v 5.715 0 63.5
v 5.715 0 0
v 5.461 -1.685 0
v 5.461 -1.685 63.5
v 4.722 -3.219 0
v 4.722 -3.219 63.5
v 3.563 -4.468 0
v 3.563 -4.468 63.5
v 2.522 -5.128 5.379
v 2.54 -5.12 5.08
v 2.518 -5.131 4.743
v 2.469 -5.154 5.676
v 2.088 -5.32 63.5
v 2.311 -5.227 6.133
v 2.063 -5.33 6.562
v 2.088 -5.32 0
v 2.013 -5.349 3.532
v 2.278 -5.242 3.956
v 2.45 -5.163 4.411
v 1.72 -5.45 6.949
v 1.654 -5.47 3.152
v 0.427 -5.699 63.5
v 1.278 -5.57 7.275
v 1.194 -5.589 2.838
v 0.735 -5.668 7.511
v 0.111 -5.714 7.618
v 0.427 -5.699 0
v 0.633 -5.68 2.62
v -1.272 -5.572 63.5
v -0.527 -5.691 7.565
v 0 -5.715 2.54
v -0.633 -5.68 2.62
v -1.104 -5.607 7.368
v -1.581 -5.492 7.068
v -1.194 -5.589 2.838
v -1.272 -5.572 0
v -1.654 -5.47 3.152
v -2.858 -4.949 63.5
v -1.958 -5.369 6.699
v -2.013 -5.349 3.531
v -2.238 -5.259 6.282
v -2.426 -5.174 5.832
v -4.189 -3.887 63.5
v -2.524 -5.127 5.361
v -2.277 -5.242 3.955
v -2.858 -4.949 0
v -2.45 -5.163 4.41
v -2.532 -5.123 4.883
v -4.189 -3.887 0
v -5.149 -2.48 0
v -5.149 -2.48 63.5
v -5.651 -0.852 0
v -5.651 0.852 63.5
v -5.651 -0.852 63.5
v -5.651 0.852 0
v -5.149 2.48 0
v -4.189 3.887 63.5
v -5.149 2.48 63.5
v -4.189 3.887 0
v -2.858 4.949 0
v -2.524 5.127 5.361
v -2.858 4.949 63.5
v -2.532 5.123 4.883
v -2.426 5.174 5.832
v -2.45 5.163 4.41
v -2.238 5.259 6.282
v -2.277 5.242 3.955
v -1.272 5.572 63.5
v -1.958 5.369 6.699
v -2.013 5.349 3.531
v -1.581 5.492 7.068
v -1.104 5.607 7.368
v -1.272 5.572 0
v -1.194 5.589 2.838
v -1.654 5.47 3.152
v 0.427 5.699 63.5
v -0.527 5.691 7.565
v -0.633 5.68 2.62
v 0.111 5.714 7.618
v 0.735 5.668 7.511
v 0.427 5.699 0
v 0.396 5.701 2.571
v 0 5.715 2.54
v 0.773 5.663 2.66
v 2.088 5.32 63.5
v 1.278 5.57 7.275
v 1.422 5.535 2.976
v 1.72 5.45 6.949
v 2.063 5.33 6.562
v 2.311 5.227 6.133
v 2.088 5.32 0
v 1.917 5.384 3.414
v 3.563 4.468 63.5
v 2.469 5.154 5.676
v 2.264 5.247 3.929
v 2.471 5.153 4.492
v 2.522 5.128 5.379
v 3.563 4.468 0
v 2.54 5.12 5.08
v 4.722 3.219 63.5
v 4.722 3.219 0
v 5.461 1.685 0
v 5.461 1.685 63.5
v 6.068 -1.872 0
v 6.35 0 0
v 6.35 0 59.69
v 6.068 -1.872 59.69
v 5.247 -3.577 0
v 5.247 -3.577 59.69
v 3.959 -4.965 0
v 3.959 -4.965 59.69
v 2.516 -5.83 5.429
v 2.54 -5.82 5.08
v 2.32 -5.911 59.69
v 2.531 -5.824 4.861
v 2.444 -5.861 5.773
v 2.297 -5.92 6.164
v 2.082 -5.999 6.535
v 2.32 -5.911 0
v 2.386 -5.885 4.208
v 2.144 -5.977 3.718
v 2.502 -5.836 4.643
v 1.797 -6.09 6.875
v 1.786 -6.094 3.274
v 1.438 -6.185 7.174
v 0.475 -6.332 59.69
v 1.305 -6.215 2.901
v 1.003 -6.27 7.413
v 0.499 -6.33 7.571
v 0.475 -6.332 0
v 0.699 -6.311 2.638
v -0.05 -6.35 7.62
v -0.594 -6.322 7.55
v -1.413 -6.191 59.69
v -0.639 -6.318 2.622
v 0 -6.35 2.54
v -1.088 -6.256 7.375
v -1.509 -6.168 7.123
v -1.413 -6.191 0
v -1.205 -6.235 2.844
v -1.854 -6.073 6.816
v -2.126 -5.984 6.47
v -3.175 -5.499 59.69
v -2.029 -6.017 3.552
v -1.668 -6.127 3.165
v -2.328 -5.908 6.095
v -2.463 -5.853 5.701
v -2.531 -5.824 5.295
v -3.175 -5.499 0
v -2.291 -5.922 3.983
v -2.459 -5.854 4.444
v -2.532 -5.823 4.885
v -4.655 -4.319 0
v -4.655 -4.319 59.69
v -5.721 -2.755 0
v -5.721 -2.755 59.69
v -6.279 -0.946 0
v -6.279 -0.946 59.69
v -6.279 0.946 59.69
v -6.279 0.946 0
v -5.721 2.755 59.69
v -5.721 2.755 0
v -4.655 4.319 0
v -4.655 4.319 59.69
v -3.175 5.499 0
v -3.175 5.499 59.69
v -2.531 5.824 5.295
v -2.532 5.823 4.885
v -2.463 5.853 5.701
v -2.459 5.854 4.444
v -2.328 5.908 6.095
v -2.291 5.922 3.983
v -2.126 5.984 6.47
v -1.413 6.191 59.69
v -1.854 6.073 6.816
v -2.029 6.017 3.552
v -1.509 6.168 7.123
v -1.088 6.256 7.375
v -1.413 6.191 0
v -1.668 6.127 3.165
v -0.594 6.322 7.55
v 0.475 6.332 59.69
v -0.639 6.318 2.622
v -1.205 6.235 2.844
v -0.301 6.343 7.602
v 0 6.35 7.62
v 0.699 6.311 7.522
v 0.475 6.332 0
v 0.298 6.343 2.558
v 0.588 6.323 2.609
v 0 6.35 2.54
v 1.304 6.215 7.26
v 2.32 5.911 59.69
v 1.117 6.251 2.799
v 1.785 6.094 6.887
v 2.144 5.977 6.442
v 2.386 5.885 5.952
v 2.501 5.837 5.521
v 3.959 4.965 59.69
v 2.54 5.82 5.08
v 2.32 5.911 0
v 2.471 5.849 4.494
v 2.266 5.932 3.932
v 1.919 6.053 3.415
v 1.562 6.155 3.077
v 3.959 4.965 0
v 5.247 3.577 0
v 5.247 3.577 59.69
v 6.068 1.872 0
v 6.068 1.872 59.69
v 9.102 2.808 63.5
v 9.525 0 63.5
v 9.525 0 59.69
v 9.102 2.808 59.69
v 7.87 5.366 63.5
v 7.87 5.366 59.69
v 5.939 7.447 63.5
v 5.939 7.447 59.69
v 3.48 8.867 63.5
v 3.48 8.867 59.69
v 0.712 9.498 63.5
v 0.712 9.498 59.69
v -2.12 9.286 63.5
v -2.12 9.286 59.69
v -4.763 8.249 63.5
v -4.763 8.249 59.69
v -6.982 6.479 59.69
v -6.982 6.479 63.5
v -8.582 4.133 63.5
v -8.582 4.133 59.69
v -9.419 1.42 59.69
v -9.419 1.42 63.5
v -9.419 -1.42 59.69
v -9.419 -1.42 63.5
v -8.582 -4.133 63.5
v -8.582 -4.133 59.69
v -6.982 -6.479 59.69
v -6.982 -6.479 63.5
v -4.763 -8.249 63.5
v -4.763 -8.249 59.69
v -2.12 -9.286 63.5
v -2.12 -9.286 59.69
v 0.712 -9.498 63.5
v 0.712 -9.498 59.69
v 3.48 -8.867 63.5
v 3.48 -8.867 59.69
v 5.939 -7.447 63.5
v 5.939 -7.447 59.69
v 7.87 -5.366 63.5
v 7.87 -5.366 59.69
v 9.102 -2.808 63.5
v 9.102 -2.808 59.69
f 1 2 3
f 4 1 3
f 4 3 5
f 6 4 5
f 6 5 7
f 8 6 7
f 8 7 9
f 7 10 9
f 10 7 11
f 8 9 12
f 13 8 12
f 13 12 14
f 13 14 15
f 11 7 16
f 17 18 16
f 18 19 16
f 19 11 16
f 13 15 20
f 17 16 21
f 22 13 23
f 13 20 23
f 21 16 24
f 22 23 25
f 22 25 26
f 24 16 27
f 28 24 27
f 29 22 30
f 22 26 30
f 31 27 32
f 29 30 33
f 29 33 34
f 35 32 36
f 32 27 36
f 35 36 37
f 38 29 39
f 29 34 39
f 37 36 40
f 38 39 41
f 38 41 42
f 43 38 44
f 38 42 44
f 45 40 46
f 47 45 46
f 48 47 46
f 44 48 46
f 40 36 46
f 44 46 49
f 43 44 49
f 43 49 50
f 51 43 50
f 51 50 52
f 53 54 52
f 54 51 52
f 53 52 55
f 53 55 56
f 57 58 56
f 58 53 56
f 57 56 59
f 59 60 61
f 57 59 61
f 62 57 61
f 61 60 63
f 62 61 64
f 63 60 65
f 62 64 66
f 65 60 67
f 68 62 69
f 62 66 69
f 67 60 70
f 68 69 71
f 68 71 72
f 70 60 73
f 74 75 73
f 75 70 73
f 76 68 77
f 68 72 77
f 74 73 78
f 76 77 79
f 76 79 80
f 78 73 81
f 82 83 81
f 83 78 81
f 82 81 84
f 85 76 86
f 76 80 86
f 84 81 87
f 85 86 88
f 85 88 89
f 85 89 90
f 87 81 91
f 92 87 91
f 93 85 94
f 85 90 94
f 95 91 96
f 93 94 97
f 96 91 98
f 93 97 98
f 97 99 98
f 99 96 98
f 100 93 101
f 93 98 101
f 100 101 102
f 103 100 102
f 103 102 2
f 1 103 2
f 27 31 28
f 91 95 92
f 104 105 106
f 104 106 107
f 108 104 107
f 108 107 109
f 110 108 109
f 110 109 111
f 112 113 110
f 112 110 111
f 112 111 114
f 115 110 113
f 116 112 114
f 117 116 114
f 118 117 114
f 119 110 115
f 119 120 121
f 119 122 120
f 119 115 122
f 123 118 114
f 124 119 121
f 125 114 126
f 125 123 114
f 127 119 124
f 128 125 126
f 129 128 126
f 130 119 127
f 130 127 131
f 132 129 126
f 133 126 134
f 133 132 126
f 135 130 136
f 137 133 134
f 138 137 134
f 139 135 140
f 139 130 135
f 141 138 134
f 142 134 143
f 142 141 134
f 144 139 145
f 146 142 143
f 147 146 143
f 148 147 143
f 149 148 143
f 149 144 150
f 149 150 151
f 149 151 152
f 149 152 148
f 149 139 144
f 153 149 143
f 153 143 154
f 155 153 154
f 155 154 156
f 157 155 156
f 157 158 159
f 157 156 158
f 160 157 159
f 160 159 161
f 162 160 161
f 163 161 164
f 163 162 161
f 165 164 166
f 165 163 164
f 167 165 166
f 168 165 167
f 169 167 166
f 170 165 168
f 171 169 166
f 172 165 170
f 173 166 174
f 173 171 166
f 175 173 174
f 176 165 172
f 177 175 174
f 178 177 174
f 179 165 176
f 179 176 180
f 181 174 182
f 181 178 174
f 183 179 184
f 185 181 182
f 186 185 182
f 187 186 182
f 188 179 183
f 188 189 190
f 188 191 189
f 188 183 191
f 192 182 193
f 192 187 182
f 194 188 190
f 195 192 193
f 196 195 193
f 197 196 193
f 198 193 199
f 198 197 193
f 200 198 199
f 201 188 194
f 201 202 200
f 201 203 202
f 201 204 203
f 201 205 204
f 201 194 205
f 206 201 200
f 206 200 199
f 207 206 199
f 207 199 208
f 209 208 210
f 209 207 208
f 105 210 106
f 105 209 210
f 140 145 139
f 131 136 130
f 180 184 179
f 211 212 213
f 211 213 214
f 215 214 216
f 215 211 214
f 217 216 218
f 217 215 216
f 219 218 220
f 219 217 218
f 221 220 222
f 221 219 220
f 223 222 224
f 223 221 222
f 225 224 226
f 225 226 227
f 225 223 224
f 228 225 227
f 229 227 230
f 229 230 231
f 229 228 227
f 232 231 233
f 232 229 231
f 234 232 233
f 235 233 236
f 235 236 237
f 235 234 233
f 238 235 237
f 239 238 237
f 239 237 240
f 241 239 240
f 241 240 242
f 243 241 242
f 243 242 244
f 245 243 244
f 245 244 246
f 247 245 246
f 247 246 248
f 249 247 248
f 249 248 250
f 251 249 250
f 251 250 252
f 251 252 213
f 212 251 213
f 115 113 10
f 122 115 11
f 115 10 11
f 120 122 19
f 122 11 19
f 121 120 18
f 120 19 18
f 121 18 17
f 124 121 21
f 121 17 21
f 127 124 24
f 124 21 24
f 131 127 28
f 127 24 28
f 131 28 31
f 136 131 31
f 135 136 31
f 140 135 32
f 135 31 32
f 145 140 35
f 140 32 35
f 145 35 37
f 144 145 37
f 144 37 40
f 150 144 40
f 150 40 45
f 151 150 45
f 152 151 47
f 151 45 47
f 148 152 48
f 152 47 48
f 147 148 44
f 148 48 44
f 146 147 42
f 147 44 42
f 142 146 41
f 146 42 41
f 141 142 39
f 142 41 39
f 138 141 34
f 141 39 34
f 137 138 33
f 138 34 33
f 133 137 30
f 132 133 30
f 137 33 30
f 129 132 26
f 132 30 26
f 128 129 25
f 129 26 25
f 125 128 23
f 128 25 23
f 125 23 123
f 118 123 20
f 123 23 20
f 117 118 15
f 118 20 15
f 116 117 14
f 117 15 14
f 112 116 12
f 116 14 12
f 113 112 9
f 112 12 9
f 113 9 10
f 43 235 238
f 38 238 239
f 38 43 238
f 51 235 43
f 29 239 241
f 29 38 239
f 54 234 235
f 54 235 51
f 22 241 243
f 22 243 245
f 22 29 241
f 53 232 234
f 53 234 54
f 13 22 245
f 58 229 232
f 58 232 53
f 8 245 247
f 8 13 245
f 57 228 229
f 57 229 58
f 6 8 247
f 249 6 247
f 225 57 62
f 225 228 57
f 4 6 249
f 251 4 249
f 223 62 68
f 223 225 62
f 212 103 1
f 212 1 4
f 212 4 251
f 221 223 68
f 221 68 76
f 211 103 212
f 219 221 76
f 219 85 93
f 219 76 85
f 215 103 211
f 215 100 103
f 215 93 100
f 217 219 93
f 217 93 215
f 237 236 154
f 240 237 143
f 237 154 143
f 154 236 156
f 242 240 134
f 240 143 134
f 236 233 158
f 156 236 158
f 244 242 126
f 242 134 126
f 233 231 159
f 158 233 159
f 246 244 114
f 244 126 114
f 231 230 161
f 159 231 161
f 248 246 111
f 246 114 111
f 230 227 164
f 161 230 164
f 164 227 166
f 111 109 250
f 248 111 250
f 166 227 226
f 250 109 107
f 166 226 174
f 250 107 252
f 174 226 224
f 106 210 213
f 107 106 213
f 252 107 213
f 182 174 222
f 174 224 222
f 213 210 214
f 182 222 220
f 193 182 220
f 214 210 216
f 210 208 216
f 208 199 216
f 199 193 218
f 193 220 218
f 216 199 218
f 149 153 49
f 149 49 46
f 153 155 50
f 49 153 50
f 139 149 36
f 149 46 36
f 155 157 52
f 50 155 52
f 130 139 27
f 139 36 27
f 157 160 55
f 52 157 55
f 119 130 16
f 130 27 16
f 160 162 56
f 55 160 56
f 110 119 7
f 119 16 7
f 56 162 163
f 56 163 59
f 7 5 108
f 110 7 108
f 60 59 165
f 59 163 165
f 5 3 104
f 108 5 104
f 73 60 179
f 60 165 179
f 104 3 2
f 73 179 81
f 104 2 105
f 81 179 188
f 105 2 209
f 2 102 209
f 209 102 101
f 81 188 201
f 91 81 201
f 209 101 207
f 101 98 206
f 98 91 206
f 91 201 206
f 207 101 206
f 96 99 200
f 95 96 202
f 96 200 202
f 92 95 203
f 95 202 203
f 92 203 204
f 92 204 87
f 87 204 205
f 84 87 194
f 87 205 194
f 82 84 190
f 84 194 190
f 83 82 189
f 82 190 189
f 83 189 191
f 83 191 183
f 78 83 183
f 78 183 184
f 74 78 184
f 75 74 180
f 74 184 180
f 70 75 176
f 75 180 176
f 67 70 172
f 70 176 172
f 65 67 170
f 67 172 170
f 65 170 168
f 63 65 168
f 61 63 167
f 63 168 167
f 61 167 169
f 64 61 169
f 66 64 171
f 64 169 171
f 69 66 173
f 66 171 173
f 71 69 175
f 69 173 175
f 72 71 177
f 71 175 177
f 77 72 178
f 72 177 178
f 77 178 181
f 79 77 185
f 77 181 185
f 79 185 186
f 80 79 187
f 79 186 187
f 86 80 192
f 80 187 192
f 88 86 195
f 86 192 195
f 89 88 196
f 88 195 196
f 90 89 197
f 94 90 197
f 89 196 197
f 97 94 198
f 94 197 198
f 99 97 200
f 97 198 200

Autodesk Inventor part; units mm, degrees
ref_plane "YZ Plane" through (0, 0, 0) normal (1, 0, 0) x (0, 1, 0)
ref_plane "XZ Plane" through (0, 0, 0) normal (0, 1, 0) x (-1, 0, 0)
sketch "Sketch1" plane through (0, 0, 0) normal (0, 0, 1) x (1, 0, 0)
  circle A0 centre (0, 0) radius 6.35
  circle A1 centre (0, 0) radius 5.715
  dimension "d0" = 12.7
  dimension "d1" = 11.43
extrude "Extrusion1" add sketch "Sketch1" along normal blind 63.5
sketch "Sketch2" plane through (0, 0, 63.5) normal (0, 0, 1) x (1, 0, 0)
  circle A0 centre (0, 0) radius 6.35 projected
  circle A1 centre (0, 0) radius 9.525
  dimension "d4" = 19.05
extrude "Extrusion2" add sketch "Sketch2" against normal blind 3.81
sketch "Sketch3" plane through (0, 0, 0) normal (0, 0, -1) x (-1, 0, 0)
  circle A0 centre (0, 0) radius 5.715 projected
  circle A1 centre (0, 0) radius 6.35 projected
  line L0 (0, 0) -> (-6.35, 0)
ref_plane "Work Plane2" through (0, 6.35, 0) normal (0, 1, 0) x (1, 0, 0)
ref_plane "Work Plane1" through (0, 0, 0) normal (0, 1, 0) x (1, 0, 0)
sketch "Sketch4" plane through (0, 6.35, 0) normal (0, 1, 0) x (1, 0, 0)
  line L0 (0, 0) -> (0, -5.08)
  circle A0 centre (0, -5.08) radius 2.54
  dimension "d9" = 5.08
  dimension "d10" = 5.08
extrude "Extrusion3" cut sketch "Sketch4" against normal blind 50.8
properties part number "LongPin" material "Steel"
